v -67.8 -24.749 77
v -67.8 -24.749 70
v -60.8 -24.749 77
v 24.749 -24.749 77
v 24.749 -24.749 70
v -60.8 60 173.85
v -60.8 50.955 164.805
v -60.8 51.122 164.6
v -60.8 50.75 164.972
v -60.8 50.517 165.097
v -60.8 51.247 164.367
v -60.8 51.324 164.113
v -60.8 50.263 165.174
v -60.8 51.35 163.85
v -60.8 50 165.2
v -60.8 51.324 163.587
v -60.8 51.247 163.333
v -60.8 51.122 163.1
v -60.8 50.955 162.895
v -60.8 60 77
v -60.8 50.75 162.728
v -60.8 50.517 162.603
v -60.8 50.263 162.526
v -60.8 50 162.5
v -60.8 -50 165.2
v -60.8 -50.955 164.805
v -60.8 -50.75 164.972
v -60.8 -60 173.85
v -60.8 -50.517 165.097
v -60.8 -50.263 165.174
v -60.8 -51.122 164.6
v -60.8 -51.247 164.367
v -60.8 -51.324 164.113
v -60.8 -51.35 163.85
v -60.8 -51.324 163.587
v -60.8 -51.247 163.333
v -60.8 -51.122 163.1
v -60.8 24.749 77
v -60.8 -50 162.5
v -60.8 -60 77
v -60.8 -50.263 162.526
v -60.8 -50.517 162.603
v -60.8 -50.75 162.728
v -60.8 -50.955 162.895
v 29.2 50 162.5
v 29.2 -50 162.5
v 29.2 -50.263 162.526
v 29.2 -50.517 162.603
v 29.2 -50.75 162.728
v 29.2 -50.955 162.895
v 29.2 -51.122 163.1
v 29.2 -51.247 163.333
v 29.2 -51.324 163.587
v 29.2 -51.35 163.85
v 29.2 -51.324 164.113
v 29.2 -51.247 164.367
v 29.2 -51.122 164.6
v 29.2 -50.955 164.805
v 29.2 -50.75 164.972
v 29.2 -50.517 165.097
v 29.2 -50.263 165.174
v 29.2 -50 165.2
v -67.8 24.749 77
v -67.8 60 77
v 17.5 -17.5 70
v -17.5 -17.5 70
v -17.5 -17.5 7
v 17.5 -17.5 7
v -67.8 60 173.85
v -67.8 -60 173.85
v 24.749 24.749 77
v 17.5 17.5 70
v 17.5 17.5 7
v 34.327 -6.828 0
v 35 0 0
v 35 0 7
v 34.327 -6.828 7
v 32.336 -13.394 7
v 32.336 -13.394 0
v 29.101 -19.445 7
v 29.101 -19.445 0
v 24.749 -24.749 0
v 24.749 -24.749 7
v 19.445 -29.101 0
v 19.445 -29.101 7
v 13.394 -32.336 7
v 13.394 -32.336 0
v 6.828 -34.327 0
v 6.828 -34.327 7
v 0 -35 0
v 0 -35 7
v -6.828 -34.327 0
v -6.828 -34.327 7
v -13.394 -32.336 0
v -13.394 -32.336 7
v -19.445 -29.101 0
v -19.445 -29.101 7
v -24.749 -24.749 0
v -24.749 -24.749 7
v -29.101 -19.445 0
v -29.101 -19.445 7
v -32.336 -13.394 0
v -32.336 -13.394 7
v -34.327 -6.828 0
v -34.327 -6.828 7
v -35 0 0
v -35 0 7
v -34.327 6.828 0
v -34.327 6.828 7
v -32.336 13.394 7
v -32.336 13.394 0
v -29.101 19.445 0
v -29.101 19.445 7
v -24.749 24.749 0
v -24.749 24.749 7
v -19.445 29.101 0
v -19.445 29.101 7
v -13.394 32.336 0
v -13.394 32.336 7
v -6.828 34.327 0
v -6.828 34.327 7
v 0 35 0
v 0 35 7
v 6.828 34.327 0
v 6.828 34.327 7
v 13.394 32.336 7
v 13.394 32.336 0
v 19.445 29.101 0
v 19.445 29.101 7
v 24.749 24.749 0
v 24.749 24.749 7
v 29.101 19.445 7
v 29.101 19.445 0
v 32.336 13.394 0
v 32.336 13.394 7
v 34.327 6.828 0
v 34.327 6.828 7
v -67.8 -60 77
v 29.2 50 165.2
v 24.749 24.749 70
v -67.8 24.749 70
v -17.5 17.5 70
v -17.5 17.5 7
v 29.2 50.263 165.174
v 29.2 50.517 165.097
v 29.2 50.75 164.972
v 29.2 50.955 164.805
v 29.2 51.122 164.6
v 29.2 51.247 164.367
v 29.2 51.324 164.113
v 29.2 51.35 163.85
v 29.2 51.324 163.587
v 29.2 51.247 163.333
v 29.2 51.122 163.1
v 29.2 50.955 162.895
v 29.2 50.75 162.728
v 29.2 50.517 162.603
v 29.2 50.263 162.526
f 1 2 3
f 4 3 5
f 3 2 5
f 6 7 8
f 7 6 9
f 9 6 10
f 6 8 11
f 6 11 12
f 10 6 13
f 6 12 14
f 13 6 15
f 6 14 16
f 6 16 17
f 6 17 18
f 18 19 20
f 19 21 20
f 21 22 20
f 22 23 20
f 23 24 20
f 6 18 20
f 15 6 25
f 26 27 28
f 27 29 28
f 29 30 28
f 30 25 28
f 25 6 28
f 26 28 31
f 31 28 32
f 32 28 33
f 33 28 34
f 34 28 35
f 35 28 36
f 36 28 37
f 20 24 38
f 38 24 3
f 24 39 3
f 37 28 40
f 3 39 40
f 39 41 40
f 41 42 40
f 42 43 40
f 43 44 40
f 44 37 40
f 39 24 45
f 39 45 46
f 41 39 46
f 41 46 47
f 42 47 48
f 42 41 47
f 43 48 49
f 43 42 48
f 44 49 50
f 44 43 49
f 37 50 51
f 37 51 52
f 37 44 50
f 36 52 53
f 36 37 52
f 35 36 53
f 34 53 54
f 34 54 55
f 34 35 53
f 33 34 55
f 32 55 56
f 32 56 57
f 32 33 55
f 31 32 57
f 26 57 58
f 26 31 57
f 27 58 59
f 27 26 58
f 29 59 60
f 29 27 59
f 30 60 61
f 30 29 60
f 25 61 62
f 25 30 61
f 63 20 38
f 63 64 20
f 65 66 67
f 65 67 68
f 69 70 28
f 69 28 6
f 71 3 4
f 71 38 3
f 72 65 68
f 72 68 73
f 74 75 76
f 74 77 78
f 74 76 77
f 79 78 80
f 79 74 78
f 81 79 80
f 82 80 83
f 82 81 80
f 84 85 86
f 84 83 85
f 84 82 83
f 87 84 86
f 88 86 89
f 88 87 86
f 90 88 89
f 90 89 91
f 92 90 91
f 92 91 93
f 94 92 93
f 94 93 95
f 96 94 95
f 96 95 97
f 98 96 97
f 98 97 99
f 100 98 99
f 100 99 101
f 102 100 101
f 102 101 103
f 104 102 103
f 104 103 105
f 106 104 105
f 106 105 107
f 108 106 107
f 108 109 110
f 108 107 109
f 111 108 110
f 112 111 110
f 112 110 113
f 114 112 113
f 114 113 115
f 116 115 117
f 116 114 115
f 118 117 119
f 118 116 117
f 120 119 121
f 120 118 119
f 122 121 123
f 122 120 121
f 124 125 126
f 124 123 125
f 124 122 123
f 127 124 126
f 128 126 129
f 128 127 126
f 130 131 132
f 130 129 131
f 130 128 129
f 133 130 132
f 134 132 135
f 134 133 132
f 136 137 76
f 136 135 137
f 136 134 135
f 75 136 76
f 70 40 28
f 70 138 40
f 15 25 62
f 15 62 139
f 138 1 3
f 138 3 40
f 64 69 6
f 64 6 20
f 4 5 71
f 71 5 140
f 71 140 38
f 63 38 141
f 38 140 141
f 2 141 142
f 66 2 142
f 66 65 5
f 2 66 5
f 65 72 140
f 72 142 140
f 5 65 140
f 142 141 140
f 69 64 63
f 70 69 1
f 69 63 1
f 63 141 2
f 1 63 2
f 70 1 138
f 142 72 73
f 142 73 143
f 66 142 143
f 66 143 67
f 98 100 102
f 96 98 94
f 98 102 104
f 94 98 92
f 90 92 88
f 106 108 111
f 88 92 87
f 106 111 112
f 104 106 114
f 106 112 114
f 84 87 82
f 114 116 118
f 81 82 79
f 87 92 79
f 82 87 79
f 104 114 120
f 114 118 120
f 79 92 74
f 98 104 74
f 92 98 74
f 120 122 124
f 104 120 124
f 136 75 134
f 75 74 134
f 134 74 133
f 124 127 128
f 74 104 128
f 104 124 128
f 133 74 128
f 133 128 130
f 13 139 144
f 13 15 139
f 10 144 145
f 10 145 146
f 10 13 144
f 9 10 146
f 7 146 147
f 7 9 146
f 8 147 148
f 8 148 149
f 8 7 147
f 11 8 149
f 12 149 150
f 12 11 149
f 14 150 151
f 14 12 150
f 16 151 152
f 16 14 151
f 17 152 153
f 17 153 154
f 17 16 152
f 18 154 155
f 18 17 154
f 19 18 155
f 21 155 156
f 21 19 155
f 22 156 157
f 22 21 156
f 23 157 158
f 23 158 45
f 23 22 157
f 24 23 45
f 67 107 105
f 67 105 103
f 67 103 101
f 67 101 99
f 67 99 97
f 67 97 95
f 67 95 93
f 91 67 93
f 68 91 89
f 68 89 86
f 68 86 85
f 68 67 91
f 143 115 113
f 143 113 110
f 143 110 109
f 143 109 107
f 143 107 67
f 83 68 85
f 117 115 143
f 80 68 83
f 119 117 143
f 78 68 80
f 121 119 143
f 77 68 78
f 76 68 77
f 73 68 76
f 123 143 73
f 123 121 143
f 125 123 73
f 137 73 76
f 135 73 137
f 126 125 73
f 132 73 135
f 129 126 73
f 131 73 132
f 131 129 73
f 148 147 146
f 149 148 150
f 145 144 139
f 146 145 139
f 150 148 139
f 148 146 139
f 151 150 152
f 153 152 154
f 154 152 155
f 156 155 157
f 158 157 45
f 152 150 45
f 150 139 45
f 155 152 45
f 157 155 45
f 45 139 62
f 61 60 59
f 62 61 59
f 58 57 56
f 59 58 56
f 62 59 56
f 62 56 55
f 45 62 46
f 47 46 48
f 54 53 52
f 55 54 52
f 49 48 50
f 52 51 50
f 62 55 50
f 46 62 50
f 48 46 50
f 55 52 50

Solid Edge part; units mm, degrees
sketch "Sketch1" plane through (0, 0, 0) normal (0, 0, 1) x (1, 0, 0)
  circle A0 centre (0, 0) radius 35
  dimension "D1" = 70
extrude "Protrusion1" add sketch "Sketch1" along normal blind 7
sketch "Sketch2" plane through (0, 0, 7) normal (0, 0, 1) x (1, 0, 0)
  line L0 (-17.5, -17.5) -> (17.5, -17.5)
  line L1 (17.5, -17.5) -> (17.5, 17.5)
  line L2 (17.5, 17.5) -> (-17.5, 17.5)
  line L3 (-17.5, 17.5) -> (-17.5, -17.5)
  dimension "D1" = 35
extrude "ExtrudedProtrusion_2" add sketch "Sketch2" along normal blind 63
sketch "Sketch3" plane through (0, 0, 70) normal (0, 0, 1) x (1, 0, 0)
  line L0 (-67.8, -24.7487) -> (24.7487, -24.7487)
  line L1 (24.7487, -24.7487) -> (24.7487, 24.7487)
  line L2 (24.7487, 24.7487) -> (-67.8, 24.7487)
  line L3 (-67.8, 24.7487) -> (-67.8, -24.7487)
  dimension "D1" = 49.4975
  dimension "D2" = 24.7487
  dimension "D3" = 67.8
extrude "ExtrudedProtrusion_3" add sketch "Sketch3" along normal blind 7
sketch "Sketch4" plane through (-67.8, 0, 73.5) normal (-1, 0, 0) x (0, -1, 0)
  line L0 (-60, 3.5) -> (60, 3.5)
  line L1 (60, 3.5) -> (60, 100.35)
  line L2 (60, 100.35) -> (-60, 100.35)
  line L3 (-60, 100.35) -> (-60, 3.5)
  dimension "D1" = 120
  dimension "D2" = 2.7
  dimension "D3" = 10
  dimension "D4" = 163.85
  dimension "D5" = 100
extrude "ExtrudedProtrusion_4" add sketch "Sketch4" against normal blind 7
sketch "Sketch5" plane through (-60.8, 0, 125.425) normal (1, 0, 0) x (0, 1, 0)
  line L0 (-50, 39.775) -> (50, 39.775)
  line L1 (50, 37.075) -> (-50, 37.075)
  arc A0 (-50, 37.075) -> (-50, 39.775) centre (-50, 38.425) cw
  arc A1 (50, 39.775) -> (50, 37.075) centre (50, 38.425) cw
  dimension "D1" = 2.7
  dimension "D2" = 100
  dimension "D3" = 163.85
extrude "ExtrudedProtrusion_5" add sketch "Sketch5" along normal blind 90
